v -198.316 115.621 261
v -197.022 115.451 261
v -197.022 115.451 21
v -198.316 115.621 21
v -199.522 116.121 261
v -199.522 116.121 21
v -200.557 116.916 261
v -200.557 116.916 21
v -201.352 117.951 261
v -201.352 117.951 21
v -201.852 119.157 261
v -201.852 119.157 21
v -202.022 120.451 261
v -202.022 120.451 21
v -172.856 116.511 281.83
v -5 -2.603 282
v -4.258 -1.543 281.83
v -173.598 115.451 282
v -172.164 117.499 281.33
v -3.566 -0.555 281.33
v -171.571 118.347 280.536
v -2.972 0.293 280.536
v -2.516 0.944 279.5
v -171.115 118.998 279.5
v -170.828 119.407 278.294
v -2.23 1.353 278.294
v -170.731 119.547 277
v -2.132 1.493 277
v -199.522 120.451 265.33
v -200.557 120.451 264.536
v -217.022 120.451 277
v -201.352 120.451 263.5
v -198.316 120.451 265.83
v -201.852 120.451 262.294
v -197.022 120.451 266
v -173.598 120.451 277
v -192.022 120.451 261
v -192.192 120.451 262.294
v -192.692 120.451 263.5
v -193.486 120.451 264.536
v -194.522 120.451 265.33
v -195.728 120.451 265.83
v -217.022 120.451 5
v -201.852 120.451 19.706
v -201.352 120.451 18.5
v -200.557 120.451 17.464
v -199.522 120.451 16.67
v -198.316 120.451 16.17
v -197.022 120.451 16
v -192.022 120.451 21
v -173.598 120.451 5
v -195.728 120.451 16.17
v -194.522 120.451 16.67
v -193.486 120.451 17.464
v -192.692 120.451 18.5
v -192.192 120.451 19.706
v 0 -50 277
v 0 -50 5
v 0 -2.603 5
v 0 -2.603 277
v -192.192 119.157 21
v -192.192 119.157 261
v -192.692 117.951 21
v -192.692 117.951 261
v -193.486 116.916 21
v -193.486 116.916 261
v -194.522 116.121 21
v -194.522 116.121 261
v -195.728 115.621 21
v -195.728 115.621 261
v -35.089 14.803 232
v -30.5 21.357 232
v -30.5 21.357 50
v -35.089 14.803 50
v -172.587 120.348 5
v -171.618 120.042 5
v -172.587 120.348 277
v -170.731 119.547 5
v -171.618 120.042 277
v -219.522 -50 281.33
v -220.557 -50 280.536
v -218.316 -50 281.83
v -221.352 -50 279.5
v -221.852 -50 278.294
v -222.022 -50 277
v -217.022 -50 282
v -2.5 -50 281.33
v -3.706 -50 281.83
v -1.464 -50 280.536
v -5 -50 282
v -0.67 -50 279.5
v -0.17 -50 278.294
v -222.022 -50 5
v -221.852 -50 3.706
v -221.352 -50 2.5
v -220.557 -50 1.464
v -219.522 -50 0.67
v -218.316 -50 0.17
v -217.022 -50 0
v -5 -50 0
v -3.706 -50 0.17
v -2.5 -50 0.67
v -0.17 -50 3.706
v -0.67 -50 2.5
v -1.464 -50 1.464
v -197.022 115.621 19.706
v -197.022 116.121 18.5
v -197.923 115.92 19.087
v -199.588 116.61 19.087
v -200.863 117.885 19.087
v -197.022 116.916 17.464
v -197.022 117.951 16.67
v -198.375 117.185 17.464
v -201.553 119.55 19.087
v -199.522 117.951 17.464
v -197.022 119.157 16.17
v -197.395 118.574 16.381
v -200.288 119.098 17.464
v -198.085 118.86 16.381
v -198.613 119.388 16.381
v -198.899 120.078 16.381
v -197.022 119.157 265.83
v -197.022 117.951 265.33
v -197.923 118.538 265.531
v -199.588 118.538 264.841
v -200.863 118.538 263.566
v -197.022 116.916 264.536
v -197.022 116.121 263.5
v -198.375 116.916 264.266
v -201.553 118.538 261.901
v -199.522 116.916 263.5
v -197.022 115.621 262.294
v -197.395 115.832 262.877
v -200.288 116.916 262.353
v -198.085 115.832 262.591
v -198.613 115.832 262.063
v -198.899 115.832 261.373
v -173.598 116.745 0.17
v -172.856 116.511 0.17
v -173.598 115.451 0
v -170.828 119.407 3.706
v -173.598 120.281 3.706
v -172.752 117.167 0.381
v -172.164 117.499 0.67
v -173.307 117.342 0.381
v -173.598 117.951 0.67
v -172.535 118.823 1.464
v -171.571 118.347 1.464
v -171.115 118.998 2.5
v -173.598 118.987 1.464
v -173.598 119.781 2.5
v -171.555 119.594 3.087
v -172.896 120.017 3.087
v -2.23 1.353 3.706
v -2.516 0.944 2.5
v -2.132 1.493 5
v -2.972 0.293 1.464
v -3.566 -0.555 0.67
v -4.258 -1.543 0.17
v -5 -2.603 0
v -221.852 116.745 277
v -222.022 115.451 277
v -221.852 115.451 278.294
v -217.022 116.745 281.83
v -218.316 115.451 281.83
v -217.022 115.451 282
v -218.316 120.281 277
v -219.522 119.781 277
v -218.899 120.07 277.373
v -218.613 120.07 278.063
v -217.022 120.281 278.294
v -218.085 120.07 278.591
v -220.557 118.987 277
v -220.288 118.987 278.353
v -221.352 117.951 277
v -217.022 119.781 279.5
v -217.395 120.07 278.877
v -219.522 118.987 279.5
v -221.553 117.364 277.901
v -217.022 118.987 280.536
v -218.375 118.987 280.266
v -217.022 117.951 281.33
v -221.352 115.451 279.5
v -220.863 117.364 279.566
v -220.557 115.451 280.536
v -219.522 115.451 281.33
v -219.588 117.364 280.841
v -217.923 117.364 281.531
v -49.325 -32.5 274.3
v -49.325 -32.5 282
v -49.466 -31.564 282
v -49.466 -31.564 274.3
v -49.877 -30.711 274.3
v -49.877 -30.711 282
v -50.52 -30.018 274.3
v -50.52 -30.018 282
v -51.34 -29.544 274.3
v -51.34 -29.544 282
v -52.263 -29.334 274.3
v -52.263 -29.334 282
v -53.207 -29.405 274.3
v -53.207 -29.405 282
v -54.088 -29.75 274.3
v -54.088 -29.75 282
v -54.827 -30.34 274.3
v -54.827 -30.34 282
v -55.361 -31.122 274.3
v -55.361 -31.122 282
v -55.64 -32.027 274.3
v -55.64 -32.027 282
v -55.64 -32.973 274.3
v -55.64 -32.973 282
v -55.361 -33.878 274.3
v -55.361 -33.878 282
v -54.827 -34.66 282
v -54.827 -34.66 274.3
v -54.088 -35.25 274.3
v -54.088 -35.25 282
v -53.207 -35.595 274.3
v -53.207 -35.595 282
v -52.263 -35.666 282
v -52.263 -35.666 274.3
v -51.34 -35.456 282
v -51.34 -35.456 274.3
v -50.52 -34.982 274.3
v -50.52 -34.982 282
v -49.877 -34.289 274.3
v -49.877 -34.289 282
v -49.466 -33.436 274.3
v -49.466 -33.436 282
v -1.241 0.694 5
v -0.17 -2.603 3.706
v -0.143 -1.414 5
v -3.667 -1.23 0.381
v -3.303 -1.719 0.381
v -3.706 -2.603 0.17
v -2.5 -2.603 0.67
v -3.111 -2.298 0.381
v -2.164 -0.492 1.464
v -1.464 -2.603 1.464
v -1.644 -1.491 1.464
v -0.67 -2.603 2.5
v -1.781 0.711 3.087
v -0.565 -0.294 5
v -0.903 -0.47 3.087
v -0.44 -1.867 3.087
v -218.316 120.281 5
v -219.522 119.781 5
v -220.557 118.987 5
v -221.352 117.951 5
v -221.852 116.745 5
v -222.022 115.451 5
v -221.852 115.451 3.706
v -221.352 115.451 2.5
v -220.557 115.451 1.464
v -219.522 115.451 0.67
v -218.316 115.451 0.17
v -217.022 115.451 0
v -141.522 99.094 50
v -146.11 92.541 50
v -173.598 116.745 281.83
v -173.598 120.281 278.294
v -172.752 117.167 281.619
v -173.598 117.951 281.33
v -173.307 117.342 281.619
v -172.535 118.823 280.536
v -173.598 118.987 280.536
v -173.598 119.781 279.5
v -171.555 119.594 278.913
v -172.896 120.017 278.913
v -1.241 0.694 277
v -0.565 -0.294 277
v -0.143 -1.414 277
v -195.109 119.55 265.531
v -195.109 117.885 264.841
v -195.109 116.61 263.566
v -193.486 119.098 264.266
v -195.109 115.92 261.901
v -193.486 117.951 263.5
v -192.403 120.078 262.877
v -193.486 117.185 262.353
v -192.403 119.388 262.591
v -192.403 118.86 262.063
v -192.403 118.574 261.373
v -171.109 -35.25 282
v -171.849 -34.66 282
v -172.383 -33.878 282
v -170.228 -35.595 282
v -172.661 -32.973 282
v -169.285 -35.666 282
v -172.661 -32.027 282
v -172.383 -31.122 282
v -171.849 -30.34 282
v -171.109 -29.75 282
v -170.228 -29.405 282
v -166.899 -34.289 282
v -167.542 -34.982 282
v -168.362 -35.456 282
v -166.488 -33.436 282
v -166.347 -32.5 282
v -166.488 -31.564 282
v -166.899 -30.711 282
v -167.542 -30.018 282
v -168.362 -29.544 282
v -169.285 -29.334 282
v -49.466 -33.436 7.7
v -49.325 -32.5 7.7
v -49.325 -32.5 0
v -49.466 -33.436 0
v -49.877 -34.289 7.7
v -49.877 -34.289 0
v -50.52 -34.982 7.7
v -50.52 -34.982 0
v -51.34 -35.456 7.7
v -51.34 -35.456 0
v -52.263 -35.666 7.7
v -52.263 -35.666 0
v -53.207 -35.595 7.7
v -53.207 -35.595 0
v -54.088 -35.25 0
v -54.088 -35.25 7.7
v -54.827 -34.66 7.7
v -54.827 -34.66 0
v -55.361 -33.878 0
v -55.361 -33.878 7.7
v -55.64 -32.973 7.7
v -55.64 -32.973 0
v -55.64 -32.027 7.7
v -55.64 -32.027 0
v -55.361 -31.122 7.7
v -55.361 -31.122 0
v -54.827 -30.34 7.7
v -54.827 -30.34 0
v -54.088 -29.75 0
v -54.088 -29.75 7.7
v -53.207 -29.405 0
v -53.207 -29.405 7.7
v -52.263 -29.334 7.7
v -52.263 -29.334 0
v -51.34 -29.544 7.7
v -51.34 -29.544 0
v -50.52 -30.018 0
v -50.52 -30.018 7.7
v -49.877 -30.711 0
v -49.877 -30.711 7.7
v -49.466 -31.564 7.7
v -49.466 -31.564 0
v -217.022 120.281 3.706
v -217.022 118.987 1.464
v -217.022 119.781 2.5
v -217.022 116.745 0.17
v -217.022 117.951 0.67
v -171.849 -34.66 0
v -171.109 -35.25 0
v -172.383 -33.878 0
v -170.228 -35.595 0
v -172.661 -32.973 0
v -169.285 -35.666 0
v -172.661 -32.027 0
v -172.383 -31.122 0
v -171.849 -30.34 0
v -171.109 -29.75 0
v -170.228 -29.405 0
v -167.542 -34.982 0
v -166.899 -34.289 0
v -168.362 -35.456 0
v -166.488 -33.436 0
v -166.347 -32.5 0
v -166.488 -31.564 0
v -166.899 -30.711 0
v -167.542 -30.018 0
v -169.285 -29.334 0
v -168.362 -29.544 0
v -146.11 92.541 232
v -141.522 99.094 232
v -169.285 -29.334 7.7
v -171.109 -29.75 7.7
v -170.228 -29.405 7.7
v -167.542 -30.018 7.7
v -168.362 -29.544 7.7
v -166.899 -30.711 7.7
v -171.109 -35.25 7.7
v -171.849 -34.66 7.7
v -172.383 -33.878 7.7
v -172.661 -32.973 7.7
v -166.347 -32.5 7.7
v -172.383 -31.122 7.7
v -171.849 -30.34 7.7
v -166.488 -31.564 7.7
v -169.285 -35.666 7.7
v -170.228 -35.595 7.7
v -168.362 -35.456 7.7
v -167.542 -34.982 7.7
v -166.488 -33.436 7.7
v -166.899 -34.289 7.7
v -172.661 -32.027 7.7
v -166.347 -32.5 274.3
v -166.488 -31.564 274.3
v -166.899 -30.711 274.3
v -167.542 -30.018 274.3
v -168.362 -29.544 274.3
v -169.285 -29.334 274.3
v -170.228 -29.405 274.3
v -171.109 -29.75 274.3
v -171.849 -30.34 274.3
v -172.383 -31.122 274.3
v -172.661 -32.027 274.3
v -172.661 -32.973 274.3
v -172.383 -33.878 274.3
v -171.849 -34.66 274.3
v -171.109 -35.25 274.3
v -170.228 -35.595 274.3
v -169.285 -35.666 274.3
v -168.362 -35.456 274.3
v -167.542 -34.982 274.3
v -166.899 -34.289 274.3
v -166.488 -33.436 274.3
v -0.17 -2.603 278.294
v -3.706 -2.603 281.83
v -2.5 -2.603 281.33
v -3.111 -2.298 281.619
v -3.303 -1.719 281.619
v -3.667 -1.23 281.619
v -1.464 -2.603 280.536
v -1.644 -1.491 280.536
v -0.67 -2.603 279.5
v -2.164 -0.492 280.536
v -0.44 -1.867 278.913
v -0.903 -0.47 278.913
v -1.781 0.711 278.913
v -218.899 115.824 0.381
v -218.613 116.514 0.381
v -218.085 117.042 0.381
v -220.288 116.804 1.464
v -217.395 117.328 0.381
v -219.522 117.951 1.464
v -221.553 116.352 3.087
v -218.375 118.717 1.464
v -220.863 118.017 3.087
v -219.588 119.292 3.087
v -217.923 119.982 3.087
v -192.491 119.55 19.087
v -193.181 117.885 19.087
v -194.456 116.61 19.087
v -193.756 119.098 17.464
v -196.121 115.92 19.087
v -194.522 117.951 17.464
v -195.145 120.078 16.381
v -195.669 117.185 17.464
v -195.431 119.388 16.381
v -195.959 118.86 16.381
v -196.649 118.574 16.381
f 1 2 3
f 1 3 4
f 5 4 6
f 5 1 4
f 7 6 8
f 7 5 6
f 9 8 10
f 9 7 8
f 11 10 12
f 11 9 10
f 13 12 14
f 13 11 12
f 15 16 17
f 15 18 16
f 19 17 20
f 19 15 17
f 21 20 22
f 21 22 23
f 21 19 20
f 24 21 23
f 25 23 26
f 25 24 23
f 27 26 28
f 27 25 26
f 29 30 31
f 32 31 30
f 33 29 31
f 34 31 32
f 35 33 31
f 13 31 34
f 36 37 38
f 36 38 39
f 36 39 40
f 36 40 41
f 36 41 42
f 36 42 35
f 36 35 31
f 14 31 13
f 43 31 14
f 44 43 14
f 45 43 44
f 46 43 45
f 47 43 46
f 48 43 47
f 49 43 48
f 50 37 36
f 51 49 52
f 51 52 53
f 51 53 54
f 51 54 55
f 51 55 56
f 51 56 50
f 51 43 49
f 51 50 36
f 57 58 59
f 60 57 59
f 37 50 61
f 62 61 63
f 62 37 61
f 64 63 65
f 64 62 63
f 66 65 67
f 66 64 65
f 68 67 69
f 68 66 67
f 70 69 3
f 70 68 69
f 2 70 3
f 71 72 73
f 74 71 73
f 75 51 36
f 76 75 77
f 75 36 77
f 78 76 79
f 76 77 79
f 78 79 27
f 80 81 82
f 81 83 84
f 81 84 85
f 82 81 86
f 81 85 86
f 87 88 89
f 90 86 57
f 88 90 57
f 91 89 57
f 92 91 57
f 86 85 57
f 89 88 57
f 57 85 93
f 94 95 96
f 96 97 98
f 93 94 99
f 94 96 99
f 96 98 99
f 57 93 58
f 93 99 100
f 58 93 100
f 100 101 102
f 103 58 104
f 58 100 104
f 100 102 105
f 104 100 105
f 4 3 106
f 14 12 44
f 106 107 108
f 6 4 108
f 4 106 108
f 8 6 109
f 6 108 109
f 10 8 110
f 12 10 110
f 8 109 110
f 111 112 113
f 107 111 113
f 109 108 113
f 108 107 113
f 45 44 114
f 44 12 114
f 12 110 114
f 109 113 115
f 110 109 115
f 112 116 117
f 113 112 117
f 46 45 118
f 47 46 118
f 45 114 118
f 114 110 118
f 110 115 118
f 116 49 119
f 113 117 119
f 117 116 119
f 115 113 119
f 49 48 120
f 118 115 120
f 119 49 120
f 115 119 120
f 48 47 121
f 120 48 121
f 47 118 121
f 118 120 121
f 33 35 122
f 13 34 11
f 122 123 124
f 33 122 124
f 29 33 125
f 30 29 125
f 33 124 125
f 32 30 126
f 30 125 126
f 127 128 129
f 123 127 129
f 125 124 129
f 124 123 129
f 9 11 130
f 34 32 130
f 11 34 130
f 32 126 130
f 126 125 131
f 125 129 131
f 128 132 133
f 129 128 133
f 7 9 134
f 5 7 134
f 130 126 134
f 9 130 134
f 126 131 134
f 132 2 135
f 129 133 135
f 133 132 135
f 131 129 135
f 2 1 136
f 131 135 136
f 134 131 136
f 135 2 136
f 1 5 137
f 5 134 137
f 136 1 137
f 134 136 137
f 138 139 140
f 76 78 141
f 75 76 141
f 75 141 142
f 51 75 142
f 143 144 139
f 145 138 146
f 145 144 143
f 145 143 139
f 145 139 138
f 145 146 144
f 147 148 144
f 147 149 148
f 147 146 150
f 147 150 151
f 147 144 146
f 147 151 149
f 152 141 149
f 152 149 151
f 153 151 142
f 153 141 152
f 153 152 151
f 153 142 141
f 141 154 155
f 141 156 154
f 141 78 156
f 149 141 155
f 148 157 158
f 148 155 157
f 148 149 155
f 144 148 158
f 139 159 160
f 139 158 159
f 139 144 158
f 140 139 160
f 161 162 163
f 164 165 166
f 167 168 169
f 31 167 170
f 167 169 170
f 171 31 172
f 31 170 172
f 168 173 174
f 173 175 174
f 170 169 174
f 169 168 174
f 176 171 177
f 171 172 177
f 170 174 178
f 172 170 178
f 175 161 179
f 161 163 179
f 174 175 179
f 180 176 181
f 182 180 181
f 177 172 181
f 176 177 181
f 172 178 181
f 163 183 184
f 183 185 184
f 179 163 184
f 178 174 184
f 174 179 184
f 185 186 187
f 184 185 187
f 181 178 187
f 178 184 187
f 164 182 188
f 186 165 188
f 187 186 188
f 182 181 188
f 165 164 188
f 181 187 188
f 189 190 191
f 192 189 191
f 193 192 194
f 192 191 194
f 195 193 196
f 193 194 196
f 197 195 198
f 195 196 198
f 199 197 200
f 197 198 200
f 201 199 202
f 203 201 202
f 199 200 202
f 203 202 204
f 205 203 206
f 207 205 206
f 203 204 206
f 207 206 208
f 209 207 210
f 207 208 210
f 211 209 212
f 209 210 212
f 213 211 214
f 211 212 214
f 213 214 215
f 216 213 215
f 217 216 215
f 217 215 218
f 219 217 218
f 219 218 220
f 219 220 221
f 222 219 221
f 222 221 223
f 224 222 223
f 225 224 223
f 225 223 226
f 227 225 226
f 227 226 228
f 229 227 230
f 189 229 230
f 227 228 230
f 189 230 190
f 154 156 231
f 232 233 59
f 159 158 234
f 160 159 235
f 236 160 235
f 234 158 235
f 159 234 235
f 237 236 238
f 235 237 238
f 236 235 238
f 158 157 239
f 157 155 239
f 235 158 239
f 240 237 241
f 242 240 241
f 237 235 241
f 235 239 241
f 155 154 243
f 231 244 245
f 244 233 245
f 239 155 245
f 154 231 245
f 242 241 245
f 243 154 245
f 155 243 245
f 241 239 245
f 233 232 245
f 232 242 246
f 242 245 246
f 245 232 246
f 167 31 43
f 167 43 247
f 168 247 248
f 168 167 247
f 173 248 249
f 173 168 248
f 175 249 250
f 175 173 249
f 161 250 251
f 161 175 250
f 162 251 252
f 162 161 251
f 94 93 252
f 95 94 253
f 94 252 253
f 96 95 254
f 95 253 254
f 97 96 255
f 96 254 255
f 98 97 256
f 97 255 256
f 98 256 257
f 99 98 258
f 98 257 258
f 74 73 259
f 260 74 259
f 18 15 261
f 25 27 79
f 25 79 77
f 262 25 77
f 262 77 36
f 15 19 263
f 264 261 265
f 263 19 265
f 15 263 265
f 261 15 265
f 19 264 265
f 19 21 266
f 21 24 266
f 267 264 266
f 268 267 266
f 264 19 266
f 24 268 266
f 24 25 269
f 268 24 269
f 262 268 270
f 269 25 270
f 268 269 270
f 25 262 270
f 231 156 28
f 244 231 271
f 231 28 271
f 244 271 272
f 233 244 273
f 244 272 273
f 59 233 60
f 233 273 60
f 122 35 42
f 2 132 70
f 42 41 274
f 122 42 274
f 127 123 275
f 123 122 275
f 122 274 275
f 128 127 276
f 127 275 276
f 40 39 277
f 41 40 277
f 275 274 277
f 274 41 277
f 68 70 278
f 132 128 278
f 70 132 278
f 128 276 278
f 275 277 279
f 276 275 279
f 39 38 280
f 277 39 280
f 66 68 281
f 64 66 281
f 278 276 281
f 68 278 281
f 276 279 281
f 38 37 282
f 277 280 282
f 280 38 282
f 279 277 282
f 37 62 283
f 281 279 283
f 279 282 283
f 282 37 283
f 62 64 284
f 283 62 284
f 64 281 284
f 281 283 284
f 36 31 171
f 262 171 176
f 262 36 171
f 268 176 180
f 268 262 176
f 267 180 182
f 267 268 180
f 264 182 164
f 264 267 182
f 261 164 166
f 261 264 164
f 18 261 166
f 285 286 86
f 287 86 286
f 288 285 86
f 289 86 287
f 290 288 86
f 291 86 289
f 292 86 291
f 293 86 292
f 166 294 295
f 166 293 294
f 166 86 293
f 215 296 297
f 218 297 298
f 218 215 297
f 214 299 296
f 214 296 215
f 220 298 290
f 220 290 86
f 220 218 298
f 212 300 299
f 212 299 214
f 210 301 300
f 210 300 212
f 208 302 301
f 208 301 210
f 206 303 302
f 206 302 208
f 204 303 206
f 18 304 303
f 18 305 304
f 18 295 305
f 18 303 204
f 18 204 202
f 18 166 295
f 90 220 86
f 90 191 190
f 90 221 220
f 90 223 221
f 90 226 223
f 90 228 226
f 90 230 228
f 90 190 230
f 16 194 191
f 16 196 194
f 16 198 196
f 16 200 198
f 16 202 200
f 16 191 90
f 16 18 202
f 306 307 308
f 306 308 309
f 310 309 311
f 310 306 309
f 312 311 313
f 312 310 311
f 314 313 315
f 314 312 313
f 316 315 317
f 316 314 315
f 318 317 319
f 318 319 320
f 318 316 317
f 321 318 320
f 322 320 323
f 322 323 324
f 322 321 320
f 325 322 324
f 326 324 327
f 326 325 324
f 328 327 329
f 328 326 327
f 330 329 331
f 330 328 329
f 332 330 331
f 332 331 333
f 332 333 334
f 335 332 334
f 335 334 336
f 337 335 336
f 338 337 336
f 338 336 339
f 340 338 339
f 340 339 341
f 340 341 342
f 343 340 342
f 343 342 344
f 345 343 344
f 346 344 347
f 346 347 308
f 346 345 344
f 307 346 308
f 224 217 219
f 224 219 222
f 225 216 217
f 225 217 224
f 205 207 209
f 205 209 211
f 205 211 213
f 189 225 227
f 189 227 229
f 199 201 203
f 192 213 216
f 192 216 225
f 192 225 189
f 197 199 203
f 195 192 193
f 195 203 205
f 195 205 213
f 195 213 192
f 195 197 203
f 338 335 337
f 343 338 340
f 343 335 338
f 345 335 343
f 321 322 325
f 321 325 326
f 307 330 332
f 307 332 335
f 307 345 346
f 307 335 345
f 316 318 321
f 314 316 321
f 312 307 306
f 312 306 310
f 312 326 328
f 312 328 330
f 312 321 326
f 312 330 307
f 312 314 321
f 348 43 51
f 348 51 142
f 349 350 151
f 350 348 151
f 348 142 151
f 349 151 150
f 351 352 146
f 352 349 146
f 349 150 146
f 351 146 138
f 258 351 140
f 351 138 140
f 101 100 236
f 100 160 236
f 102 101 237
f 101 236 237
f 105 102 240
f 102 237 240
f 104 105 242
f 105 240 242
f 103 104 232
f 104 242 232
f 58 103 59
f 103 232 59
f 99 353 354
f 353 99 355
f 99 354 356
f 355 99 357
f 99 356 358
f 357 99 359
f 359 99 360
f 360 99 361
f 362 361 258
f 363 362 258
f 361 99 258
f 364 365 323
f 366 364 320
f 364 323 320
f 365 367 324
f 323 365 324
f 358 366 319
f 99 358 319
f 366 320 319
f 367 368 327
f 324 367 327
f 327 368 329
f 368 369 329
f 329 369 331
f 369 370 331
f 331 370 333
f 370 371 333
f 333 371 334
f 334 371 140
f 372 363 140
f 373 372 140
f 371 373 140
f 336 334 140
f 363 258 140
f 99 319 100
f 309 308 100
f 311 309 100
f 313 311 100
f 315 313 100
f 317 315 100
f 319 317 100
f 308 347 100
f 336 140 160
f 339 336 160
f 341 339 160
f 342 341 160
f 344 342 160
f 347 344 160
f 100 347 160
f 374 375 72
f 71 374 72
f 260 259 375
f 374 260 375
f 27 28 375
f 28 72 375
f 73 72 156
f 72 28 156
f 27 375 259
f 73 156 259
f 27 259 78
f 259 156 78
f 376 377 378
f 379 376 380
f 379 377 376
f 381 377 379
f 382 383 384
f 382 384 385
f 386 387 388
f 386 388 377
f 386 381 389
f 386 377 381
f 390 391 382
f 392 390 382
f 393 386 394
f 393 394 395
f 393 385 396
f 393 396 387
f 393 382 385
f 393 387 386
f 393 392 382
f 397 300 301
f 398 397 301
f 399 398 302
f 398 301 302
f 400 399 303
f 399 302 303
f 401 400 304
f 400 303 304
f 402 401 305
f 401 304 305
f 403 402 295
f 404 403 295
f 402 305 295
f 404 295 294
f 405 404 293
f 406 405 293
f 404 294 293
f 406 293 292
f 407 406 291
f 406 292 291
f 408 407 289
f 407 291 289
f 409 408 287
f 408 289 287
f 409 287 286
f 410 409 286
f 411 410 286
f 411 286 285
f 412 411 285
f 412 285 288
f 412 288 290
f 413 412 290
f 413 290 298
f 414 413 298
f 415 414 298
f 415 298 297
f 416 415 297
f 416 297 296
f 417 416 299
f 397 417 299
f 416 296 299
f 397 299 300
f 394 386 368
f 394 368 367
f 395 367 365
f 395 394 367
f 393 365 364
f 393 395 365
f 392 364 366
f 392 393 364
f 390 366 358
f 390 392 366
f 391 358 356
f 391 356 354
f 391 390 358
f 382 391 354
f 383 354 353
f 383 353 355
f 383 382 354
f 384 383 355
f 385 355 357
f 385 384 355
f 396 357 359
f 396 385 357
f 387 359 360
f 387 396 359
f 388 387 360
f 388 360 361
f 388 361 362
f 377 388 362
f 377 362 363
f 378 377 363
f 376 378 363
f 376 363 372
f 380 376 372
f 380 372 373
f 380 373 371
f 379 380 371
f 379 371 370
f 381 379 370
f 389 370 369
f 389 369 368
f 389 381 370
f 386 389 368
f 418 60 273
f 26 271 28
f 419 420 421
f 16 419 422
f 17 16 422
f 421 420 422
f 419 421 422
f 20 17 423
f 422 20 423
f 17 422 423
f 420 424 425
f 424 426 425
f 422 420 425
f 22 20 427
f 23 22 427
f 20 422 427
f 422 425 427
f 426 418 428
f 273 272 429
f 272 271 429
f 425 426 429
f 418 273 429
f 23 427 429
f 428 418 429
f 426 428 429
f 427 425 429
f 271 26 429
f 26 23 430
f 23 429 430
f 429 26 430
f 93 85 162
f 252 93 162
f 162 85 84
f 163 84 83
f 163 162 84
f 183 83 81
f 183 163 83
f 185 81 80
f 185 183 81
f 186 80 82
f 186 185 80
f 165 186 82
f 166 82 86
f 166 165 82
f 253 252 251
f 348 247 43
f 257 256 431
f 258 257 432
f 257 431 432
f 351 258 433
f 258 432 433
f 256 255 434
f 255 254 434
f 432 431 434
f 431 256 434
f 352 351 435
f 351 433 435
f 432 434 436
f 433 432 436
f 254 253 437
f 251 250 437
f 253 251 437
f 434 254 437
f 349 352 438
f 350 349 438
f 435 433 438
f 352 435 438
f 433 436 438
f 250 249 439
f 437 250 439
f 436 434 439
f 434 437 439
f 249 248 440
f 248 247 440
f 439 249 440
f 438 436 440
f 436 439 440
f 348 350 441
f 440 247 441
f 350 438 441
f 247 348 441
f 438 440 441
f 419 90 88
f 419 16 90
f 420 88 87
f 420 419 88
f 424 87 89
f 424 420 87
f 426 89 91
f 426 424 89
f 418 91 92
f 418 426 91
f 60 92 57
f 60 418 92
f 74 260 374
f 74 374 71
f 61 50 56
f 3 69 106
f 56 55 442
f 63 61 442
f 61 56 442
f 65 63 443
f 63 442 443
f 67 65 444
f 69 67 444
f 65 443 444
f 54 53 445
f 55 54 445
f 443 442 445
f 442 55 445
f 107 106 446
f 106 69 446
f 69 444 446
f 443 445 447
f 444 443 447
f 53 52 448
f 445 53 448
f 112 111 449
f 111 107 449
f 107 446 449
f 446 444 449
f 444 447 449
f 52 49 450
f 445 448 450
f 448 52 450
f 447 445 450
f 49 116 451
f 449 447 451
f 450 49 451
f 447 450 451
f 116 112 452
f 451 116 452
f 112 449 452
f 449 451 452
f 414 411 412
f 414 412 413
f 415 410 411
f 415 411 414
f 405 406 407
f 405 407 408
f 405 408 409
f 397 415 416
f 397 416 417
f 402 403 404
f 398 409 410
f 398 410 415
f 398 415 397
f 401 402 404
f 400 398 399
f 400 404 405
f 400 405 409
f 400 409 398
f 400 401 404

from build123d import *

# Parameters (mm, degrees)
SKETCH1_W           = 50
SKETCH1_H           = 170.451051634
BOSS_EXTRUDE1_DEPTH = 282
CUT_EXTRUDE1_DEPTH  = 8
CUT_EXTRUDE2_DEPTH  = 5
FILLET3_R           = 5
SKETCH5_R           = 3.175
CUT_EXTRUDE3_DEPTH  = 7.7
CUT_EXTRUDE4_START  = -7.7
SKETCH6_R           = 3.175
CUT_EXTRUDE4_DEPTH  = 7.7
FILLET4_R           = 5


with BuildPart() as part:
    # Sketch1 → Boss-Extrude1 (new body)
    with BuildSketch(Plane.XY):
        with Locations((-197.021929301, 35.225525817)):
            Rectangle(SKETCH1_W, SKETCH1_H)
        Polygon((0, -50), (0, 0), (-172.021929301, 120.451051634), (-172.021929301, -50), align=None)
    extrude(amount=BOSS_EXTRUDE1_DEPTH)

    # Sketch3 → Cut-Extrude1 (cut)
    with BuildSketch(Plane(origin=(0, 0, 0), x_dir=(0.819152044288989, -0.5735764363510502, 0), z_dir=(0.5735764363510502, 0.819152044288989, 0))):
        Polygon((-37.234042553, -232), (-172.765957447, -50), (-172.765957447, -232), align=None)
        Polygon((-37.234042553, -50), (-172.765957447, -50), (-37.234042553, -232), align=None)
    extrude(amount=-CUT_EXTRUDE1_DEPTH, mode=Mode.SUBTRACT)

    # Sketch4 → Cut-Extrude2 (cut)
    with BuildSketch(Plane(origin=(0, 120.451051634, 0), x_dir=(1, 0, 0), z_dir=(0, 1, 0))):
        Polygon((-202.021929301, -112.8), (-192.021929301, -169.2), (-192.021929301, -16), (-202.021929301, -16), align=None)
        Polygon((-192.021929301, -266), (-192.021929301, -169.2), (-202.021929301, -112.8), (-202.021929301, -266), align=None)
    extrude(amount=-CUT_EXTRUDE2_DEPTH, mode=Mode.SUBTRACT)

    # Fillet3
    # the kernel refuses this fillet: 5 mm, written as the material it adds along each edge
    with BuildSketch(Plane(origin=(-197.021929301, 120.451051634, 261), x_dir=(0, 0, 1), z_dir=(0, -1, 0))) as fillet3_piece_1_section:
        Polygon((0, 0), (FILLET3_R * 1.02, 0), (FILLET3_R * 1.02, FILLET3_R * 1.02), (0, FILLET3_R * 1.02), align=None)
    fillet3_piece_1 = extrude(amount=FILLET3_R * 1.02, mode=Mode.PRIVATE)
    fillet3_piece_1 = fillet3_piece_1 - Plane(origin=(-197.021929301, 120.451051634, 261), x_dir=(0.7071067811865475, 0, -0.7071067811865475), z_dir=(0, -1, 0)) * Sphere(FILLET3_R, mode=Mode.PRIVATE)
    with BuildSketch(Plane(origin=(-197.021929301, 120.451051634, 21), x_dir=(0, -1, 0), z_dir=(0, 0, -1))) as fillet3_piece_2_section:
        Polygon((0, 0), (FILLET3_R * 1.02, 0), (FILLET3_R * 1.02, FILLET3_R * 1.02), (0, FILLET3_R * 1.02), align=None)
    fillet3_piece_2 = extrude(amount=FILLET3_R * 1.02, mode=Mode.PRIVATE)
    fillet3_piece_2 = fillet3_piece_2 - Plane(origin=(-197.021929301, 120.451051634, 21), x_dir=(0.7071067811865474, 0.7071067811865478, 0), z_dir=(0, 0, -1)) * Sphere(FILLET3_R, mode=Mode.PRIVATE)
    with BuildSketch(Plane(origin=(-197.021929301, 120.451051634, 261), x_dir=(0, 0, 1), z_dir=(1, 0, 0))) as fillet3_piece_3_section:
        Polygon((0, 0), (FILLET3_R * 1.02, 0), (FILLET3_R * 1.02, FILLET3_R * 1.02), (0, FILLET3_R * 1.02), align=None)
    fillet3_piece_3 = extrude(amount=FILLET3_R * 1.02, mode=Mode.PRIVATE)
    fillet3_piece_3 = fillet3_piece_3 - Plane(origin=(-197.021929301, 120.451051634, 261), x_dir=(0, 0.7071067811865475, -0.7071067811865475), z_dir=(1, 0, 0)) * Sphere(FILLET3_R, mode=Mode.PRIVATE)
    with BuildSketch(Plane(origin=(-197.021929301, 120.451051634, 21), x_dir=(1, 0, 0), z_dir=(0, 0, -1))) as fillet3_piece_4_section:
        Polygon((0, 0), (FILLET3_R * 1.02, 0), (FILLET3_R * 1.02, FILLET3_R * 1.02), (0, FILLET3_R * 1.02), align=None)
    fillet3_piece_4 = extrude(amount=FILLET3_R * 1.02, mode=Mode.PRIVATE)
    fillet3_piece_4 = fillet3_piece_4 - Plane(origin=(-197.021929301, 120.451051634, 21), x_dir=(-0.7071067811865478, 0.7071067811865474, 0), z_dir=(0, 0, -1)) * Sphere(FILLET3_R, mode=Mode.PRIVATE)
    with BuildSketch(Plane(origin=(-192.021929301, 115.451051634, 261), x_dir=(0, 1, 0), z_dir=(0, 0, -1))) as fillet3_piece_5:
        with BuildLine():
            CenterArc((FILLET3_R, -FILLET3_R), FILLET3_R, 90, 90)
            Line((0, -FILLET3_R), (0, 0))
            Line((0, 0), (FILLET3_R, 0))
        make_face()
    fillet3_piece_5_solid = extrude(amount=240, mode=Mode.PRIVATE)
    with BuildSketch(Plane(origin=(-202.021929301, 115.451051634, 261), x_dir=(0, 1, 0), z_dir=(0, 0, -1))) as fillet3_piece_6:
        with BuildLine():
            CenterArc((FILLET3_R, FILLET3_R), FILLET3_R, 180, 90)
            Line((0, FILLET3_R), (0, 0))
            Line((0, 0), (FILLET3_R, 0))
        make_face()
    fillet3_piece_6_solid = extrude(amount=240, mode=Mode.PRIVATE)
    add([fillet3_piece_1, fillet3_piece_2, fillet3_piece_3, fillet3_piece_4, fillet3_piece_5_solid, fillet3_piece_6_solid])

    # Sketch5 → Cut-Extrude3 (cut)
    with BuildSketch(Plane.XY.offset(282)):
        with Locations((-52.5, -32.5)):
            Circle(SKETCH5_R)
        with Locations((-169.521929301, -32.5)):
            Circle(SKETCH5_R)
    extrude(amount=-CUT_EXTRUDE3_DEPTH, mode=Mode.SUBTRACT)

    # Sketch6 → Cut-Extrude4 (cut)
    with BuildSketch(Plane(origin=(0, 0, 0), x_dir=(-1, 0, 0), z_dir=(0, 0, -1)).offset(CUT_EXTRUDE4_START)):
        with Locations(Location((169.521929301, -32.5, 0), (0, 0, 180))):
            Circle(SKETCH6_R)
        with Locations(Location((52.5, -32.5, 0), (0, 0, 180))):
            Circle(SKETCH6_R)
    extrude(amount=CUT_EXTRUDE4_DEPTH, mode=Mode.SUBTRACT)

    # Fillet4
    fillet4_edges = [part.edges().sort_by_distance(p)[0] for p in [
        (-222.021929301, 35.225525817, 282),
        (-172.021929301, 120.451051634, 141),
        (0, 0, 141),
        (-222.021929301, 120.451051634, 141),
        (0, -25, 282),
        (-86.01096465, 60.225525817, 282),
        (-197.021929301, 120.451051634, 282),
        (-86.01096465, 60.225525817, 0),
        (0, -25, 0),
        (-222.021929301, 35.225525817, 0),
        (-197.021929301, 120.451051634, 0),
    ]]
    fillet(fillet4_edges, radius=FILLET4_R)


solid = part.part
